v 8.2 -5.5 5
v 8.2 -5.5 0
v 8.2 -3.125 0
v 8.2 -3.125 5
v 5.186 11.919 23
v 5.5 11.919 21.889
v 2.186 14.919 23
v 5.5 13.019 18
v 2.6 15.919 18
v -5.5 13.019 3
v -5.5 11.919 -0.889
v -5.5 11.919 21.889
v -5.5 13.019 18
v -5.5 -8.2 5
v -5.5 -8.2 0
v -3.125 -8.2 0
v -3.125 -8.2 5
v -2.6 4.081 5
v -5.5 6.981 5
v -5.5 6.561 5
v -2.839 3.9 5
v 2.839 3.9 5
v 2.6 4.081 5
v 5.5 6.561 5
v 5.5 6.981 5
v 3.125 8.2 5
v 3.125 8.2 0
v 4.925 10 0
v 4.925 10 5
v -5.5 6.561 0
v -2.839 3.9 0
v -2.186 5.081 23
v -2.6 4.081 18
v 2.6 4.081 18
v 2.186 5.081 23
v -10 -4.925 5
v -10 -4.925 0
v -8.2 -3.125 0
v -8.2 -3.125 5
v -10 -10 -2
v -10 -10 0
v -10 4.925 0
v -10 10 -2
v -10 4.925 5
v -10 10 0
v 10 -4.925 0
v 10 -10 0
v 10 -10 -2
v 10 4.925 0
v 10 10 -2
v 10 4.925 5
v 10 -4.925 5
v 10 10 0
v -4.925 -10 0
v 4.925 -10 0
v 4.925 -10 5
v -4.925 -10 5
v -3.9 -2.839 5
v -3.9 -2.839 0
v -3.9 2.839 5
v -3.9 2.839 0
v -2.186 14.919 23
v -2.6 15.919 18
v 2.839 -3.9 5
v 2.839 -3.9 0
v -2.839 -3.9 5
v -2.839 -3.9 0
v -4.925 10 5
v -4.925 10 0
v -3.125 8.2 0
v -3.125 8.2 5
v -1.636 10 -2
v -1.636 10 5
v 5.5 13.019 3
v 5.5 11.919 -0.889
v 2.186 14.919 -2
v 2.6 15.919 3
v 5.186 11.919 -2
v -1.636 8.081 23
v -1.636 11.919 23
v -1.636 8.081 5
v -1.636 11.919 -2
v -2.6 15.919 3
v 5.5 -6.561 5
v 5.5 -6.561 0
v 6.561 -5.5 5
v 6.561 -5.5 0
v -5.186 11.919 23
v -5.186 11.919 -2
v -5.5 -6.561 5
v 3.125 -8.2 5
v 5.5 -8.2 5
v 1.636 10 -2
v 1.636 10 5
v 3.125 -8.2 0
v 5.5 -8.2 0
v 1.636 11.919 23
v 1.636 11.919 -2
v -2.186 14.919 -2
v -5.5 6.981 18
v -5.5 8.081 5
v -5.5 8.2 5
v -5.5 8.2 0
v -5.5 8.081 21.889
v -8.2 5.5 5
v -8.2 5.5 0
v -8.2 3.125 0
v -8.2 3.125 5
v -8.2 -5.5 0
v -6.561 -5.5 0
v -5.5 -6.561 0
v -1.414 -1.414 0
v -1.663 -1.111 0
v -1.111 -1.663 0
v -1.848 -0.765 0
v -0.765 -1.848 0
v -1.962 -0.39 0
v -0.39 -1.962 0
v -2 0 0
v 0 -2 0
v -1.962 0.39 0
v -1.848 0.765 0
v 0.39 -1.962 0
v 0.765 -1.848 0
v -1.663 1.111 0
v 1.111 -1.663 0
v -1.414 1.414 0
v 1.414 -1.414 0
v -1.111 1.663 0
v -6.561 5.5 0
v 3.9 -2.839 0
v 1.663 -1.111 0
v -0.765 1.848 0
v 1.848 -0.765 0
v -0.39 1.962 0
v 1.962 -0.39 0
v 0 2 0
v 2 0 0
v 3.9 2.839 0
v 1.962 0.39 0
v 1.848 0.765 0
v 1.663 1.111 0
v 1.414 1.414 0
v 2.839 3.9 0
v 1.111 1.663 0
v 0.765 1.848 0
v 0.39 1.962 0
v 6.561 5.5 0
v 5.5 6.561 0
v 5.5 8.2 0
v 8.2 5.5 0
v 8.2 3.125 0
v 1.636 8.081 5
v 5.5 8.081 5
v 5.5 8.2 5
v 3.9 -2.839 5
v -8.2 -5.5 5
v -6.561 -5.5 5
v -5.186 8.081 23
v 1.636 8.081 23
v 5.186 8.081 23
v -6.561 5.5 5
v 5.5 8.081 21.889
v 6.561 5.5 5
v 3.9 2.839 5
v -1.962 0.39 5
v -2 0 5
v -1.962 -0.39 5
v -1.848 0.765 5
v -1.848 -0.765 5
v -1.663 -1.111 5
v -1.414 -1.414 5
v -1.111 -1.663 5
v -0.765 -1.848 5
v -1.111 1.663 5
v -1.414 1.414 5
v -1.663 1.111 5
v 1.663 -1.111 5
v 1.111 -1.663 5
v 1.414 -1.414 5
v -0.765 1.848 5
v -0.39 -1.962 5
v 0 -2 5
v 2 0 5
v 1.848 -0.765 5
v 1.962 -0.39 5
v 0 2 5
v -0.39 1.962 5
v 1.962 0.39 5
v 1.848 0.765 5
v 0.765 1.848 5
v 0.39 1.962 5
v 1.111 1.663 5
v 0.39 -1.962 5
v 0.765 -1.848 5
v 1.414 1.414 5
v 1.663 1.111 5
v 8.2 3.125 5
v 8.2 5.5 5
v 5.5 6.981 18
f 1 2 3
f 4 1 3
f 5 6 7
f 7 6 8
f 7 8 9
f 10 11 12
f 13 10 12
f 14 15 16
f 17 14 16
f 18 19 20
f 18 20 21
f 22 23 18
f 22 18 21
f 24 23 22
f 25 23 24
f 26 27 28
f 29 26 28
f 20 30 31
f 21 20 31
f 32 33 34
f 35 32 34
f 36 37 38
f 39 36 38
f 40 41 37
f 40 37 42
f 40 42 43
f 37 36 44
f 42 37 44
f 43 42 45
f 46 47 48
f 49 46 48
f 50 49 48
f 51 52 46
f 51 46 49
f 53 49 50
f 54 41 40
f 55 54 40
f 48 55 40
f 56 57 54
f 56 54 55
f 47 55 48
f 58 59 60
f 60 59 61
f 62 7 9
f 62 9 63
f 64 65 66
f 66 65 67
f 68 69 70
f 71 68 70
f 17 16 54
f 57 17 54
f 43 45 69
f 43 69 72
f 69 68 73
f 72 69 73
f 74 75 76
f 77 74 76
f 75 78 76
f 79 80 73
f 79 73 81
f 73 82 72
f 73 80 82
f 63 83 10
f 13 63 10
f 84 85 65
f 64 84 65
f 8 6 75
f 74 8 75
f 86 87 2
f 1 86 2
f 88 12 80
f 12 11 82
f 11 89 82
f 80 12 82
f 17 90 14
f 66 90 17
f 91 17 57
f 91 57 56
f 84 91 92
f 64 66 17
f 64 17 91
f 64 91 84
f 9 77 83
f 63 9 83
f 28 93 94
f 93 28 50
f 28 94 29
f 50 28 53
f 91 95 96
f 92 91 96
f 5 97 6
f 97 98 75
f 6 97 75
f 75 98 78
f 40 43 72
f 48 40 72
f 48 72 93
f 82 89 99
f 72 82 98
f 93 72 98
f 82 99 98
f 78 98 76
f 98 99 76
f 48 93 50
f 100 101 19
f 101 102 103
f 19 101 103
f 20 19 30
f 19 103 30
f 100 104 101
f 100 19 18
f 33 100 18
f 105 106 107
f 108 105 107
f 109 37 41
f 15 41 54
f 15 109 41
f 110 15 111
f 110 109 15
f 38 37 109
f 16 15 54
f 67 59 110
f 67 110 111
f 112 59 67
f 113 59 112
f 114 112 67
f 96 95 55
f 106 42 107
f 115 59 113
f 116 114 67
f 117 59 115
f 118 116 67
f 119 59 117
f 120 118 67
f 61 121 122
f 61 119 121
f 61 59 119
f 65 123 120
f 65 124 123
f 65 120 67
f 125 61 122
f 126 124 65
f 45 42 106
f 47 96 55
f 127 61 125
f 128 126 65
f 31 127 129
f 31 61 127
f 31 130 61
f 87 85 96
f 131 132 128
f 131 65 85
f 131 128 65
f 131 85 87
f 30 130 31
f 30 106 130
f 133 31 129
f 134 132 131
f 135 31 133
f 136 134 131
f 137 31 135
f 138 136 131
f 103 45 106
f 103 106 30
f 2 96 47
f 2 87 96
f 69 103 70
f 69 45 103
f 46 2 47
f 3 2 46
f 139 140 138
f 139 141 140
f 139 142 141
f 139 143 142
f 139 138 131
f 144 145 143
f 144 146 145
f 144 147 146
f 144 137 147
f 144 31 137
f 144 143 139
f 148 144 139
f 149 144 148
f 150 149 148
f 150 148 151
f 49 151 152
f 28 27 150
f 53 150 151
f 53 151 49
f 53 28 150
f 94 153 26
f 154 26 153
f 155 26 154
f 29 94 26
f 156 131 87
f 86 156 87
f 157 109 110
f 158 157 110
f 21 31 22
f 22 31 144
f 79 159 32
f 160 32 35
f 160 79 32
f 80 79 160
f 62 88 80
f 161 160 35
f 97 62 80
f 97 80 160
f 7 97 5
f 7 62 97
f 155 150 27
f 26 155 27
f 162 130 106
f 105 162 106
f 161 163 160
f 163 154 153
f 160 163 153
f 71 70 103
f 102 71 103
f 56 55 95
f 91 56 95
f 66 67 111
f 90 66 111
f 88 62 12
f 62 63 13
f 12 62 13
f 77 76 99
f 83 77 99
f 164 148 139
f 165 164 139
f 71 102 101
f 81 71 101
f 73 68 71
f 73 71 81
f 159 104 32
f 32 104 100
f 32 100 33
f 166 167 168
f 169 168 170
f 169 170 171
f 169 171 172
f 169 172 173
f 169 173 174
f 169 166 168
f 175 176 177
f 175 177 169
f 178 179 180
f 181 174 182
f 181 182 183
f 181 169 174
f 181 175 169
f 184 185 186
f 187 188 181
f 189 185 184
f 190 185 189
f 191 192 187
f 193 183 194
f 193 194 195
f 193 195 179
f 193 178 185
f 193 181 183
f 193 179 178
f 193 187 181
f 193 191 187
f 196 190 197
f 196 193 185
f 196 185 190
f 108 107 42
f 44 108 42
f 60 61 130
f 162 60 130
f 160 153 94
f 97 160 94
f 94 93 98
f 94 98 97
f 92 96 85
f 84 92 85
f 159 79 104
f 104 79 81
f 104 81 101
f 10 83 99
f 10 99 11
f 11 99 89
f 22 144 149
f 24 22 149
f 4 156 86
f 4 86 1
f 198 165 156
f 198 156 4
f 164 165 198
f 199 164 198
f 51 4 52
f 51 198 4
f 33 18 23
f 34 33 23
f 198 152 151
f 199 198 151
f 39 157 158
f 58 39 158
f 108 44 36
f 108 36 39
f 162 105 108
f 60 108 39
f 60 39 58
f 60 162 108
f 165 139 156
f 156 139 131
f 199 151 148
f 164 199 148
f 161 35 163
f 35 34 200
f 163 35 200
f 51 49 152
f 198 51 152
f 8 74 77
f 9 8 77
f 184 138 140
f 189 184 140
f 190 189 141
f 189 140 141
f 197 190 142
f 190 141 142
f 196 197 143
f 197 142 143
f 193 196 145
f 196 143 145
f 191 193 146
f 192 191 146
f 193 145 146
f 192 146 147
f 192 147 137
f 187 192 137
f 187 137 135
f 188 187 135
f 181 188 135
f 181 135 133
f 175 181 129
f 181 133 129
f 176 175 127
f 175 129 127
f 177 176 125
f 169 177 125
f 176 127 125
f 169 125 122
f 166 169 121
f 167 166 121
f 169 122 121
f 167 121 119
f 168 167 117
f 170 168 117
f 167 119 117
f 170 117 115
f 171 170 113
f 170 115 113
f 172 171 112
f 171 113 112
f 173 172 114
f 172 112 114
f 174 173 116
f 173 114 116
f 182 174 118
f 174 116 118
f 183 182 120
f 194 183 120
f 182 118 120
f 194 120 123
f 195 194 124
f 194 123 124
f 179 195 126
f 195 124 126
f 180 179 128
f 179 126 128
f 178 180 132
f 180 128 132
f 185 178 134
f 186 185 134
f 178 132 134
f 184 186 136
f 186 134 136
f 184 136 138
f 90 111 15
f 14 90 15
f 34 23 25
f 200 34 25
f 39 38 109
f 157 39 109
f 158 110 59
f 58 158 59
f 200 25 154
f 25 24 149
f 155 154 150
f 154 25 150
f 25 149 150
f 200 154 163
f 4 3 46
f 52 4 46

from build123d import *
from OCP.BRepFilletAPI import BRepFilletAPI_MakeChamfer

# Parameters (mm, degrees)
BOSS_EXTRUDE1_DEPTH   = 5
BOSS_EXTRUDE1_2_DEPTH = 5
BOSS_EXTRUDE1_3_DEPTH = 5
BOSS_EXTRUDE1_4_DEPTH = 5
SKETCH1_R             = 2
BOSS_EXTRUDE1_5_DEPTH = 5
SKETCH1_3_W           = 20
SKETCH1_3_H           = 20
BOSS_EXTRUDE2_DEPTH   = 2
BOSS_EXTRUDE3_DEPTH   = 7
BOSS_EXTRUDE4_DEPTH   = 18
CHAMFER1_SIZE         = 1
CHAMFER1_SIZE2        = 5
CHAMFER2_SIZE         = 5
CHAMFER2_SIZE2        = 1
CHAMFER3_SIZE         = 1
CHAMFER3_SIZE2        = 5


with BuildPart() as part:
    # Sketch1 → Boss-Extrude1 (new body)
    with BuildSketch(Plane.XY):
        Polygon((4.925, 10), (-4.925, 10), (-3.125, 8.2), (-5.5, 8.2), (-5.5, 6.560660172), (-2.839339828, 3.9), (2.839339828, 3.9), (5.5, 6.560660172), (5.5, 8.2), (3.125, 8.2), align=None)
    extrude(amount=BOSS_EXTRUDE1_DEPTH)



with BuildPart() as body_2:
    # Sketch1 → Boss-Extrude1 2 (new body)
    with BuildSketch(Plane.XY):
        Polygon((-8.2, 3.125), (-10, 4.925), (-10, -4.925), (-8.2, -3.125), (-8.2, -5.5), (-6.560660172, -5.5), (-3.9, -2.839339828), (-3.9, 2.839339828), (-6.560660172, 5.5), (-8.2, 5.5), align=None)
    extrude(amount=BOSS_EXTRUDE1_2_DEPTH)


with BuildPart() as body_3:
    # Sketch1 → Boss-Extrude1 3 (new body)
    with BuildSketch(Plane.XY):
        Polygon((10, -4.925), (10, 4.925), (8.2, 3.125), (8.2, 5.5), (6.560660172, 5.5), (3.9, 2.839339828), (3.9, -2.839339828), (6.560660172, -5.5), (8.2, -5.5), (8.2, -3.125), align=None)
    extrude(amount=BOSS_EXTRUDE1_3_DEPTH)


with BuildPart() as body_4:
    # Sketch1 → Boss-Extrude1 4 (new body)
    with BuildSketch(Plane.XY):
        Polygon((-3.125, -8.2), (-4.925, -10), (4.925, -10), (3.125, -8.2), (5.5, -8.2), (5.5, -6.560660172), (2.839339828, -3.9), (-2.839339828, -3.9), (-5.5, -6.560660172), (-5.5, -8.2), align=None)
    extrude(amount=BOSS_EXTRUDE1_4_DEPTH)


with BuildPart() as body_5:
    # Sketch1 → Boss-Extrude1 5 (new body)
    with BuildSketch(Plane.XY):
        Circle(SKETCH1_R)
    extrude(amount=BOSS_EXTRUDE1_5_DEPTH)


with BuildPart() as part_1:
    add(part.part)

    add(body_2.part)  # Boss-Extrude2 merges body 2

    add(body_3.part)  # Boss-Extrude2 merges body 3

    add(body_4.part)  # Boss-Extrude2 merges body 4

    add(body_5.part)  # Boss-Extrude2 merges body 5
    # Sketch1<3> → Boss-Extrude2 (add)
    with BuildSketch(Plane.XY):
        Rectangle(SKETCH1_3_W, SKETCH1_3_H)
    extrude(amount=-BOSS_EXTRUDE2_DEPTH)

    # Sketch2 → Boss-Extrude3 (add)
    with BuildSketch(Plane.XY.offset(5)):
        Polygon((-1.635636459, 11.91873161), (-1.635636459, 10), (1.635636459, 10), (1.635636459, 11.91873161), (5.5, 11.91873161), (5.5, 13.01873161), (2.6, 15.91873161), (-2.6, 15.91873161), (-5.5, 13.01873161), (-5.5, 11.91873161), align=None)
    extrude(amount=-BOSS_EXTRUDE3_DEPTH)

    # Sketch2<4> → Boss-Extrude4 (add)
    with BuildSketch(Plane.XY.offset(5)):
        Polygon((-5.5, 8.08126839), (-5.5, 6.98126839), (-2.6, 4.08126839), (2.6, 4.08126839), (5.5, 6.98126839), (5.5, 8.08126839), (1.635636459, 8.08126839), (1.635636459, 11.91873161), (5.5, 11.91873161), (5.5, 13.01873161), (2.6, 15.91873161), (-2.6, 15.91873161), (-5.5, 13.01873161), (-5.5, 11.91873161), (-1.635636459, 11.91873161), (-1.635636459, 8.08126839), align=None)
    extrude(amount=BOSS_EXTRUDE4_DEPTH)

    # Chamfer1
    chamfer1_edges = [part_1.edges().sort_by_distance(p)[0] for p in [
        (4.05, 14.46873161, 23),
        (0, 15.91873161, 23),
        (-4.05, 14.46873161, 23),
    ]]
    chamfer1_side = [part_1.faces().sort_by_distance(p)[0] for p in [
        (0, 10, 23),
    ]]
    chamfer(chamfer1_edges, length=CHAMFER1_SIZE, length2=CHAMFER1_SIZE2, reference=chamfer1_side[0])

    # Chamfer2: one chamfer whose edges measure the first distance from different faces: ONE call of the kernel's chamfer builder (chamfer() names one face for all edges)
    chamfer2_edges_1 = [part_1.edges().sort_by_distance(p)[0] for p in [
        (4.05, 14.46873161, -2),
    ]]
    chamfer2_side_1 = [part_1.faces().sort_by_distance(p)[0] for p in [
        (4.05, 14.46873161, 8),
    ]]
    chamfer2_edges_2 = [part_1.edges().sort_by_distance(p)[0] for p in [
        (0, 15.91873161, -2),
    ]]
    chamfer2_side_2 = [part_1.faces().sort_by_distance(p)[0] for p in [
        (0, 15.91873161, 8),
    ]]
    chamfer2_edges_3 = [part_1.edges().sort_by_distance(p)[0] for p in [
        (-4.05, 14.46873161, -2),
    ]]
    chamfer2_side_3 = [part_1.faces().sort_by_distance(p)[0] for p in [
        (-4.05, 14.46873161, 8),
    ]]
    chamfer2 = BRepFilletAPI_MakeChamfer(part_1.part.solid().wrapped)
    for e in chamfer2_edges_1:
        chamfer2.Add(CHAMFER2_SIZE, CHAMFER2_SIZE2, e.wrapped, chamfer2_side_1[0].wrapped)  # the first distance lies on this face
    for e in chamfer2_edges_2:
        chamfer2.Add(CHAMFER2_SIZE, CHAMFER2_SIZE2, e.wrapped, chamfer2_side_2[0].wrapped)  # the first distance lies on this face
    for e in chamfer2_edges_3:
        chamfer2.Add(CHAMFER2_SIZE, CHAMFER2_SIZE2, e.wrapped, chamfer2_side_3[0].wrapped)  # the first distance lies on this face
    add(Compound.cast(chamfer2.Shape()), mode=Mode.REPLACE)

    # Chamfer3
    chamfer3_edges = [part_1.edges().sort_by_distance(p)[0] for p in [
        (4.05, 5.53126839, 23),
        (0, 4.08126839, 23),
        (-4.05, 5.53126839, 23),
    ]]
    chamfer3_side = [part_1.faces().sort_by_distance(p)[0] for p in [
        (0, 9.15065978, 23),
    ]]
    chamfer(chamfer3_edges, length=CHAMFER3_SIZE, length2=CHAMFER3_SIZE2, reference=chamfer3_side[0])


solid = part_1.part
